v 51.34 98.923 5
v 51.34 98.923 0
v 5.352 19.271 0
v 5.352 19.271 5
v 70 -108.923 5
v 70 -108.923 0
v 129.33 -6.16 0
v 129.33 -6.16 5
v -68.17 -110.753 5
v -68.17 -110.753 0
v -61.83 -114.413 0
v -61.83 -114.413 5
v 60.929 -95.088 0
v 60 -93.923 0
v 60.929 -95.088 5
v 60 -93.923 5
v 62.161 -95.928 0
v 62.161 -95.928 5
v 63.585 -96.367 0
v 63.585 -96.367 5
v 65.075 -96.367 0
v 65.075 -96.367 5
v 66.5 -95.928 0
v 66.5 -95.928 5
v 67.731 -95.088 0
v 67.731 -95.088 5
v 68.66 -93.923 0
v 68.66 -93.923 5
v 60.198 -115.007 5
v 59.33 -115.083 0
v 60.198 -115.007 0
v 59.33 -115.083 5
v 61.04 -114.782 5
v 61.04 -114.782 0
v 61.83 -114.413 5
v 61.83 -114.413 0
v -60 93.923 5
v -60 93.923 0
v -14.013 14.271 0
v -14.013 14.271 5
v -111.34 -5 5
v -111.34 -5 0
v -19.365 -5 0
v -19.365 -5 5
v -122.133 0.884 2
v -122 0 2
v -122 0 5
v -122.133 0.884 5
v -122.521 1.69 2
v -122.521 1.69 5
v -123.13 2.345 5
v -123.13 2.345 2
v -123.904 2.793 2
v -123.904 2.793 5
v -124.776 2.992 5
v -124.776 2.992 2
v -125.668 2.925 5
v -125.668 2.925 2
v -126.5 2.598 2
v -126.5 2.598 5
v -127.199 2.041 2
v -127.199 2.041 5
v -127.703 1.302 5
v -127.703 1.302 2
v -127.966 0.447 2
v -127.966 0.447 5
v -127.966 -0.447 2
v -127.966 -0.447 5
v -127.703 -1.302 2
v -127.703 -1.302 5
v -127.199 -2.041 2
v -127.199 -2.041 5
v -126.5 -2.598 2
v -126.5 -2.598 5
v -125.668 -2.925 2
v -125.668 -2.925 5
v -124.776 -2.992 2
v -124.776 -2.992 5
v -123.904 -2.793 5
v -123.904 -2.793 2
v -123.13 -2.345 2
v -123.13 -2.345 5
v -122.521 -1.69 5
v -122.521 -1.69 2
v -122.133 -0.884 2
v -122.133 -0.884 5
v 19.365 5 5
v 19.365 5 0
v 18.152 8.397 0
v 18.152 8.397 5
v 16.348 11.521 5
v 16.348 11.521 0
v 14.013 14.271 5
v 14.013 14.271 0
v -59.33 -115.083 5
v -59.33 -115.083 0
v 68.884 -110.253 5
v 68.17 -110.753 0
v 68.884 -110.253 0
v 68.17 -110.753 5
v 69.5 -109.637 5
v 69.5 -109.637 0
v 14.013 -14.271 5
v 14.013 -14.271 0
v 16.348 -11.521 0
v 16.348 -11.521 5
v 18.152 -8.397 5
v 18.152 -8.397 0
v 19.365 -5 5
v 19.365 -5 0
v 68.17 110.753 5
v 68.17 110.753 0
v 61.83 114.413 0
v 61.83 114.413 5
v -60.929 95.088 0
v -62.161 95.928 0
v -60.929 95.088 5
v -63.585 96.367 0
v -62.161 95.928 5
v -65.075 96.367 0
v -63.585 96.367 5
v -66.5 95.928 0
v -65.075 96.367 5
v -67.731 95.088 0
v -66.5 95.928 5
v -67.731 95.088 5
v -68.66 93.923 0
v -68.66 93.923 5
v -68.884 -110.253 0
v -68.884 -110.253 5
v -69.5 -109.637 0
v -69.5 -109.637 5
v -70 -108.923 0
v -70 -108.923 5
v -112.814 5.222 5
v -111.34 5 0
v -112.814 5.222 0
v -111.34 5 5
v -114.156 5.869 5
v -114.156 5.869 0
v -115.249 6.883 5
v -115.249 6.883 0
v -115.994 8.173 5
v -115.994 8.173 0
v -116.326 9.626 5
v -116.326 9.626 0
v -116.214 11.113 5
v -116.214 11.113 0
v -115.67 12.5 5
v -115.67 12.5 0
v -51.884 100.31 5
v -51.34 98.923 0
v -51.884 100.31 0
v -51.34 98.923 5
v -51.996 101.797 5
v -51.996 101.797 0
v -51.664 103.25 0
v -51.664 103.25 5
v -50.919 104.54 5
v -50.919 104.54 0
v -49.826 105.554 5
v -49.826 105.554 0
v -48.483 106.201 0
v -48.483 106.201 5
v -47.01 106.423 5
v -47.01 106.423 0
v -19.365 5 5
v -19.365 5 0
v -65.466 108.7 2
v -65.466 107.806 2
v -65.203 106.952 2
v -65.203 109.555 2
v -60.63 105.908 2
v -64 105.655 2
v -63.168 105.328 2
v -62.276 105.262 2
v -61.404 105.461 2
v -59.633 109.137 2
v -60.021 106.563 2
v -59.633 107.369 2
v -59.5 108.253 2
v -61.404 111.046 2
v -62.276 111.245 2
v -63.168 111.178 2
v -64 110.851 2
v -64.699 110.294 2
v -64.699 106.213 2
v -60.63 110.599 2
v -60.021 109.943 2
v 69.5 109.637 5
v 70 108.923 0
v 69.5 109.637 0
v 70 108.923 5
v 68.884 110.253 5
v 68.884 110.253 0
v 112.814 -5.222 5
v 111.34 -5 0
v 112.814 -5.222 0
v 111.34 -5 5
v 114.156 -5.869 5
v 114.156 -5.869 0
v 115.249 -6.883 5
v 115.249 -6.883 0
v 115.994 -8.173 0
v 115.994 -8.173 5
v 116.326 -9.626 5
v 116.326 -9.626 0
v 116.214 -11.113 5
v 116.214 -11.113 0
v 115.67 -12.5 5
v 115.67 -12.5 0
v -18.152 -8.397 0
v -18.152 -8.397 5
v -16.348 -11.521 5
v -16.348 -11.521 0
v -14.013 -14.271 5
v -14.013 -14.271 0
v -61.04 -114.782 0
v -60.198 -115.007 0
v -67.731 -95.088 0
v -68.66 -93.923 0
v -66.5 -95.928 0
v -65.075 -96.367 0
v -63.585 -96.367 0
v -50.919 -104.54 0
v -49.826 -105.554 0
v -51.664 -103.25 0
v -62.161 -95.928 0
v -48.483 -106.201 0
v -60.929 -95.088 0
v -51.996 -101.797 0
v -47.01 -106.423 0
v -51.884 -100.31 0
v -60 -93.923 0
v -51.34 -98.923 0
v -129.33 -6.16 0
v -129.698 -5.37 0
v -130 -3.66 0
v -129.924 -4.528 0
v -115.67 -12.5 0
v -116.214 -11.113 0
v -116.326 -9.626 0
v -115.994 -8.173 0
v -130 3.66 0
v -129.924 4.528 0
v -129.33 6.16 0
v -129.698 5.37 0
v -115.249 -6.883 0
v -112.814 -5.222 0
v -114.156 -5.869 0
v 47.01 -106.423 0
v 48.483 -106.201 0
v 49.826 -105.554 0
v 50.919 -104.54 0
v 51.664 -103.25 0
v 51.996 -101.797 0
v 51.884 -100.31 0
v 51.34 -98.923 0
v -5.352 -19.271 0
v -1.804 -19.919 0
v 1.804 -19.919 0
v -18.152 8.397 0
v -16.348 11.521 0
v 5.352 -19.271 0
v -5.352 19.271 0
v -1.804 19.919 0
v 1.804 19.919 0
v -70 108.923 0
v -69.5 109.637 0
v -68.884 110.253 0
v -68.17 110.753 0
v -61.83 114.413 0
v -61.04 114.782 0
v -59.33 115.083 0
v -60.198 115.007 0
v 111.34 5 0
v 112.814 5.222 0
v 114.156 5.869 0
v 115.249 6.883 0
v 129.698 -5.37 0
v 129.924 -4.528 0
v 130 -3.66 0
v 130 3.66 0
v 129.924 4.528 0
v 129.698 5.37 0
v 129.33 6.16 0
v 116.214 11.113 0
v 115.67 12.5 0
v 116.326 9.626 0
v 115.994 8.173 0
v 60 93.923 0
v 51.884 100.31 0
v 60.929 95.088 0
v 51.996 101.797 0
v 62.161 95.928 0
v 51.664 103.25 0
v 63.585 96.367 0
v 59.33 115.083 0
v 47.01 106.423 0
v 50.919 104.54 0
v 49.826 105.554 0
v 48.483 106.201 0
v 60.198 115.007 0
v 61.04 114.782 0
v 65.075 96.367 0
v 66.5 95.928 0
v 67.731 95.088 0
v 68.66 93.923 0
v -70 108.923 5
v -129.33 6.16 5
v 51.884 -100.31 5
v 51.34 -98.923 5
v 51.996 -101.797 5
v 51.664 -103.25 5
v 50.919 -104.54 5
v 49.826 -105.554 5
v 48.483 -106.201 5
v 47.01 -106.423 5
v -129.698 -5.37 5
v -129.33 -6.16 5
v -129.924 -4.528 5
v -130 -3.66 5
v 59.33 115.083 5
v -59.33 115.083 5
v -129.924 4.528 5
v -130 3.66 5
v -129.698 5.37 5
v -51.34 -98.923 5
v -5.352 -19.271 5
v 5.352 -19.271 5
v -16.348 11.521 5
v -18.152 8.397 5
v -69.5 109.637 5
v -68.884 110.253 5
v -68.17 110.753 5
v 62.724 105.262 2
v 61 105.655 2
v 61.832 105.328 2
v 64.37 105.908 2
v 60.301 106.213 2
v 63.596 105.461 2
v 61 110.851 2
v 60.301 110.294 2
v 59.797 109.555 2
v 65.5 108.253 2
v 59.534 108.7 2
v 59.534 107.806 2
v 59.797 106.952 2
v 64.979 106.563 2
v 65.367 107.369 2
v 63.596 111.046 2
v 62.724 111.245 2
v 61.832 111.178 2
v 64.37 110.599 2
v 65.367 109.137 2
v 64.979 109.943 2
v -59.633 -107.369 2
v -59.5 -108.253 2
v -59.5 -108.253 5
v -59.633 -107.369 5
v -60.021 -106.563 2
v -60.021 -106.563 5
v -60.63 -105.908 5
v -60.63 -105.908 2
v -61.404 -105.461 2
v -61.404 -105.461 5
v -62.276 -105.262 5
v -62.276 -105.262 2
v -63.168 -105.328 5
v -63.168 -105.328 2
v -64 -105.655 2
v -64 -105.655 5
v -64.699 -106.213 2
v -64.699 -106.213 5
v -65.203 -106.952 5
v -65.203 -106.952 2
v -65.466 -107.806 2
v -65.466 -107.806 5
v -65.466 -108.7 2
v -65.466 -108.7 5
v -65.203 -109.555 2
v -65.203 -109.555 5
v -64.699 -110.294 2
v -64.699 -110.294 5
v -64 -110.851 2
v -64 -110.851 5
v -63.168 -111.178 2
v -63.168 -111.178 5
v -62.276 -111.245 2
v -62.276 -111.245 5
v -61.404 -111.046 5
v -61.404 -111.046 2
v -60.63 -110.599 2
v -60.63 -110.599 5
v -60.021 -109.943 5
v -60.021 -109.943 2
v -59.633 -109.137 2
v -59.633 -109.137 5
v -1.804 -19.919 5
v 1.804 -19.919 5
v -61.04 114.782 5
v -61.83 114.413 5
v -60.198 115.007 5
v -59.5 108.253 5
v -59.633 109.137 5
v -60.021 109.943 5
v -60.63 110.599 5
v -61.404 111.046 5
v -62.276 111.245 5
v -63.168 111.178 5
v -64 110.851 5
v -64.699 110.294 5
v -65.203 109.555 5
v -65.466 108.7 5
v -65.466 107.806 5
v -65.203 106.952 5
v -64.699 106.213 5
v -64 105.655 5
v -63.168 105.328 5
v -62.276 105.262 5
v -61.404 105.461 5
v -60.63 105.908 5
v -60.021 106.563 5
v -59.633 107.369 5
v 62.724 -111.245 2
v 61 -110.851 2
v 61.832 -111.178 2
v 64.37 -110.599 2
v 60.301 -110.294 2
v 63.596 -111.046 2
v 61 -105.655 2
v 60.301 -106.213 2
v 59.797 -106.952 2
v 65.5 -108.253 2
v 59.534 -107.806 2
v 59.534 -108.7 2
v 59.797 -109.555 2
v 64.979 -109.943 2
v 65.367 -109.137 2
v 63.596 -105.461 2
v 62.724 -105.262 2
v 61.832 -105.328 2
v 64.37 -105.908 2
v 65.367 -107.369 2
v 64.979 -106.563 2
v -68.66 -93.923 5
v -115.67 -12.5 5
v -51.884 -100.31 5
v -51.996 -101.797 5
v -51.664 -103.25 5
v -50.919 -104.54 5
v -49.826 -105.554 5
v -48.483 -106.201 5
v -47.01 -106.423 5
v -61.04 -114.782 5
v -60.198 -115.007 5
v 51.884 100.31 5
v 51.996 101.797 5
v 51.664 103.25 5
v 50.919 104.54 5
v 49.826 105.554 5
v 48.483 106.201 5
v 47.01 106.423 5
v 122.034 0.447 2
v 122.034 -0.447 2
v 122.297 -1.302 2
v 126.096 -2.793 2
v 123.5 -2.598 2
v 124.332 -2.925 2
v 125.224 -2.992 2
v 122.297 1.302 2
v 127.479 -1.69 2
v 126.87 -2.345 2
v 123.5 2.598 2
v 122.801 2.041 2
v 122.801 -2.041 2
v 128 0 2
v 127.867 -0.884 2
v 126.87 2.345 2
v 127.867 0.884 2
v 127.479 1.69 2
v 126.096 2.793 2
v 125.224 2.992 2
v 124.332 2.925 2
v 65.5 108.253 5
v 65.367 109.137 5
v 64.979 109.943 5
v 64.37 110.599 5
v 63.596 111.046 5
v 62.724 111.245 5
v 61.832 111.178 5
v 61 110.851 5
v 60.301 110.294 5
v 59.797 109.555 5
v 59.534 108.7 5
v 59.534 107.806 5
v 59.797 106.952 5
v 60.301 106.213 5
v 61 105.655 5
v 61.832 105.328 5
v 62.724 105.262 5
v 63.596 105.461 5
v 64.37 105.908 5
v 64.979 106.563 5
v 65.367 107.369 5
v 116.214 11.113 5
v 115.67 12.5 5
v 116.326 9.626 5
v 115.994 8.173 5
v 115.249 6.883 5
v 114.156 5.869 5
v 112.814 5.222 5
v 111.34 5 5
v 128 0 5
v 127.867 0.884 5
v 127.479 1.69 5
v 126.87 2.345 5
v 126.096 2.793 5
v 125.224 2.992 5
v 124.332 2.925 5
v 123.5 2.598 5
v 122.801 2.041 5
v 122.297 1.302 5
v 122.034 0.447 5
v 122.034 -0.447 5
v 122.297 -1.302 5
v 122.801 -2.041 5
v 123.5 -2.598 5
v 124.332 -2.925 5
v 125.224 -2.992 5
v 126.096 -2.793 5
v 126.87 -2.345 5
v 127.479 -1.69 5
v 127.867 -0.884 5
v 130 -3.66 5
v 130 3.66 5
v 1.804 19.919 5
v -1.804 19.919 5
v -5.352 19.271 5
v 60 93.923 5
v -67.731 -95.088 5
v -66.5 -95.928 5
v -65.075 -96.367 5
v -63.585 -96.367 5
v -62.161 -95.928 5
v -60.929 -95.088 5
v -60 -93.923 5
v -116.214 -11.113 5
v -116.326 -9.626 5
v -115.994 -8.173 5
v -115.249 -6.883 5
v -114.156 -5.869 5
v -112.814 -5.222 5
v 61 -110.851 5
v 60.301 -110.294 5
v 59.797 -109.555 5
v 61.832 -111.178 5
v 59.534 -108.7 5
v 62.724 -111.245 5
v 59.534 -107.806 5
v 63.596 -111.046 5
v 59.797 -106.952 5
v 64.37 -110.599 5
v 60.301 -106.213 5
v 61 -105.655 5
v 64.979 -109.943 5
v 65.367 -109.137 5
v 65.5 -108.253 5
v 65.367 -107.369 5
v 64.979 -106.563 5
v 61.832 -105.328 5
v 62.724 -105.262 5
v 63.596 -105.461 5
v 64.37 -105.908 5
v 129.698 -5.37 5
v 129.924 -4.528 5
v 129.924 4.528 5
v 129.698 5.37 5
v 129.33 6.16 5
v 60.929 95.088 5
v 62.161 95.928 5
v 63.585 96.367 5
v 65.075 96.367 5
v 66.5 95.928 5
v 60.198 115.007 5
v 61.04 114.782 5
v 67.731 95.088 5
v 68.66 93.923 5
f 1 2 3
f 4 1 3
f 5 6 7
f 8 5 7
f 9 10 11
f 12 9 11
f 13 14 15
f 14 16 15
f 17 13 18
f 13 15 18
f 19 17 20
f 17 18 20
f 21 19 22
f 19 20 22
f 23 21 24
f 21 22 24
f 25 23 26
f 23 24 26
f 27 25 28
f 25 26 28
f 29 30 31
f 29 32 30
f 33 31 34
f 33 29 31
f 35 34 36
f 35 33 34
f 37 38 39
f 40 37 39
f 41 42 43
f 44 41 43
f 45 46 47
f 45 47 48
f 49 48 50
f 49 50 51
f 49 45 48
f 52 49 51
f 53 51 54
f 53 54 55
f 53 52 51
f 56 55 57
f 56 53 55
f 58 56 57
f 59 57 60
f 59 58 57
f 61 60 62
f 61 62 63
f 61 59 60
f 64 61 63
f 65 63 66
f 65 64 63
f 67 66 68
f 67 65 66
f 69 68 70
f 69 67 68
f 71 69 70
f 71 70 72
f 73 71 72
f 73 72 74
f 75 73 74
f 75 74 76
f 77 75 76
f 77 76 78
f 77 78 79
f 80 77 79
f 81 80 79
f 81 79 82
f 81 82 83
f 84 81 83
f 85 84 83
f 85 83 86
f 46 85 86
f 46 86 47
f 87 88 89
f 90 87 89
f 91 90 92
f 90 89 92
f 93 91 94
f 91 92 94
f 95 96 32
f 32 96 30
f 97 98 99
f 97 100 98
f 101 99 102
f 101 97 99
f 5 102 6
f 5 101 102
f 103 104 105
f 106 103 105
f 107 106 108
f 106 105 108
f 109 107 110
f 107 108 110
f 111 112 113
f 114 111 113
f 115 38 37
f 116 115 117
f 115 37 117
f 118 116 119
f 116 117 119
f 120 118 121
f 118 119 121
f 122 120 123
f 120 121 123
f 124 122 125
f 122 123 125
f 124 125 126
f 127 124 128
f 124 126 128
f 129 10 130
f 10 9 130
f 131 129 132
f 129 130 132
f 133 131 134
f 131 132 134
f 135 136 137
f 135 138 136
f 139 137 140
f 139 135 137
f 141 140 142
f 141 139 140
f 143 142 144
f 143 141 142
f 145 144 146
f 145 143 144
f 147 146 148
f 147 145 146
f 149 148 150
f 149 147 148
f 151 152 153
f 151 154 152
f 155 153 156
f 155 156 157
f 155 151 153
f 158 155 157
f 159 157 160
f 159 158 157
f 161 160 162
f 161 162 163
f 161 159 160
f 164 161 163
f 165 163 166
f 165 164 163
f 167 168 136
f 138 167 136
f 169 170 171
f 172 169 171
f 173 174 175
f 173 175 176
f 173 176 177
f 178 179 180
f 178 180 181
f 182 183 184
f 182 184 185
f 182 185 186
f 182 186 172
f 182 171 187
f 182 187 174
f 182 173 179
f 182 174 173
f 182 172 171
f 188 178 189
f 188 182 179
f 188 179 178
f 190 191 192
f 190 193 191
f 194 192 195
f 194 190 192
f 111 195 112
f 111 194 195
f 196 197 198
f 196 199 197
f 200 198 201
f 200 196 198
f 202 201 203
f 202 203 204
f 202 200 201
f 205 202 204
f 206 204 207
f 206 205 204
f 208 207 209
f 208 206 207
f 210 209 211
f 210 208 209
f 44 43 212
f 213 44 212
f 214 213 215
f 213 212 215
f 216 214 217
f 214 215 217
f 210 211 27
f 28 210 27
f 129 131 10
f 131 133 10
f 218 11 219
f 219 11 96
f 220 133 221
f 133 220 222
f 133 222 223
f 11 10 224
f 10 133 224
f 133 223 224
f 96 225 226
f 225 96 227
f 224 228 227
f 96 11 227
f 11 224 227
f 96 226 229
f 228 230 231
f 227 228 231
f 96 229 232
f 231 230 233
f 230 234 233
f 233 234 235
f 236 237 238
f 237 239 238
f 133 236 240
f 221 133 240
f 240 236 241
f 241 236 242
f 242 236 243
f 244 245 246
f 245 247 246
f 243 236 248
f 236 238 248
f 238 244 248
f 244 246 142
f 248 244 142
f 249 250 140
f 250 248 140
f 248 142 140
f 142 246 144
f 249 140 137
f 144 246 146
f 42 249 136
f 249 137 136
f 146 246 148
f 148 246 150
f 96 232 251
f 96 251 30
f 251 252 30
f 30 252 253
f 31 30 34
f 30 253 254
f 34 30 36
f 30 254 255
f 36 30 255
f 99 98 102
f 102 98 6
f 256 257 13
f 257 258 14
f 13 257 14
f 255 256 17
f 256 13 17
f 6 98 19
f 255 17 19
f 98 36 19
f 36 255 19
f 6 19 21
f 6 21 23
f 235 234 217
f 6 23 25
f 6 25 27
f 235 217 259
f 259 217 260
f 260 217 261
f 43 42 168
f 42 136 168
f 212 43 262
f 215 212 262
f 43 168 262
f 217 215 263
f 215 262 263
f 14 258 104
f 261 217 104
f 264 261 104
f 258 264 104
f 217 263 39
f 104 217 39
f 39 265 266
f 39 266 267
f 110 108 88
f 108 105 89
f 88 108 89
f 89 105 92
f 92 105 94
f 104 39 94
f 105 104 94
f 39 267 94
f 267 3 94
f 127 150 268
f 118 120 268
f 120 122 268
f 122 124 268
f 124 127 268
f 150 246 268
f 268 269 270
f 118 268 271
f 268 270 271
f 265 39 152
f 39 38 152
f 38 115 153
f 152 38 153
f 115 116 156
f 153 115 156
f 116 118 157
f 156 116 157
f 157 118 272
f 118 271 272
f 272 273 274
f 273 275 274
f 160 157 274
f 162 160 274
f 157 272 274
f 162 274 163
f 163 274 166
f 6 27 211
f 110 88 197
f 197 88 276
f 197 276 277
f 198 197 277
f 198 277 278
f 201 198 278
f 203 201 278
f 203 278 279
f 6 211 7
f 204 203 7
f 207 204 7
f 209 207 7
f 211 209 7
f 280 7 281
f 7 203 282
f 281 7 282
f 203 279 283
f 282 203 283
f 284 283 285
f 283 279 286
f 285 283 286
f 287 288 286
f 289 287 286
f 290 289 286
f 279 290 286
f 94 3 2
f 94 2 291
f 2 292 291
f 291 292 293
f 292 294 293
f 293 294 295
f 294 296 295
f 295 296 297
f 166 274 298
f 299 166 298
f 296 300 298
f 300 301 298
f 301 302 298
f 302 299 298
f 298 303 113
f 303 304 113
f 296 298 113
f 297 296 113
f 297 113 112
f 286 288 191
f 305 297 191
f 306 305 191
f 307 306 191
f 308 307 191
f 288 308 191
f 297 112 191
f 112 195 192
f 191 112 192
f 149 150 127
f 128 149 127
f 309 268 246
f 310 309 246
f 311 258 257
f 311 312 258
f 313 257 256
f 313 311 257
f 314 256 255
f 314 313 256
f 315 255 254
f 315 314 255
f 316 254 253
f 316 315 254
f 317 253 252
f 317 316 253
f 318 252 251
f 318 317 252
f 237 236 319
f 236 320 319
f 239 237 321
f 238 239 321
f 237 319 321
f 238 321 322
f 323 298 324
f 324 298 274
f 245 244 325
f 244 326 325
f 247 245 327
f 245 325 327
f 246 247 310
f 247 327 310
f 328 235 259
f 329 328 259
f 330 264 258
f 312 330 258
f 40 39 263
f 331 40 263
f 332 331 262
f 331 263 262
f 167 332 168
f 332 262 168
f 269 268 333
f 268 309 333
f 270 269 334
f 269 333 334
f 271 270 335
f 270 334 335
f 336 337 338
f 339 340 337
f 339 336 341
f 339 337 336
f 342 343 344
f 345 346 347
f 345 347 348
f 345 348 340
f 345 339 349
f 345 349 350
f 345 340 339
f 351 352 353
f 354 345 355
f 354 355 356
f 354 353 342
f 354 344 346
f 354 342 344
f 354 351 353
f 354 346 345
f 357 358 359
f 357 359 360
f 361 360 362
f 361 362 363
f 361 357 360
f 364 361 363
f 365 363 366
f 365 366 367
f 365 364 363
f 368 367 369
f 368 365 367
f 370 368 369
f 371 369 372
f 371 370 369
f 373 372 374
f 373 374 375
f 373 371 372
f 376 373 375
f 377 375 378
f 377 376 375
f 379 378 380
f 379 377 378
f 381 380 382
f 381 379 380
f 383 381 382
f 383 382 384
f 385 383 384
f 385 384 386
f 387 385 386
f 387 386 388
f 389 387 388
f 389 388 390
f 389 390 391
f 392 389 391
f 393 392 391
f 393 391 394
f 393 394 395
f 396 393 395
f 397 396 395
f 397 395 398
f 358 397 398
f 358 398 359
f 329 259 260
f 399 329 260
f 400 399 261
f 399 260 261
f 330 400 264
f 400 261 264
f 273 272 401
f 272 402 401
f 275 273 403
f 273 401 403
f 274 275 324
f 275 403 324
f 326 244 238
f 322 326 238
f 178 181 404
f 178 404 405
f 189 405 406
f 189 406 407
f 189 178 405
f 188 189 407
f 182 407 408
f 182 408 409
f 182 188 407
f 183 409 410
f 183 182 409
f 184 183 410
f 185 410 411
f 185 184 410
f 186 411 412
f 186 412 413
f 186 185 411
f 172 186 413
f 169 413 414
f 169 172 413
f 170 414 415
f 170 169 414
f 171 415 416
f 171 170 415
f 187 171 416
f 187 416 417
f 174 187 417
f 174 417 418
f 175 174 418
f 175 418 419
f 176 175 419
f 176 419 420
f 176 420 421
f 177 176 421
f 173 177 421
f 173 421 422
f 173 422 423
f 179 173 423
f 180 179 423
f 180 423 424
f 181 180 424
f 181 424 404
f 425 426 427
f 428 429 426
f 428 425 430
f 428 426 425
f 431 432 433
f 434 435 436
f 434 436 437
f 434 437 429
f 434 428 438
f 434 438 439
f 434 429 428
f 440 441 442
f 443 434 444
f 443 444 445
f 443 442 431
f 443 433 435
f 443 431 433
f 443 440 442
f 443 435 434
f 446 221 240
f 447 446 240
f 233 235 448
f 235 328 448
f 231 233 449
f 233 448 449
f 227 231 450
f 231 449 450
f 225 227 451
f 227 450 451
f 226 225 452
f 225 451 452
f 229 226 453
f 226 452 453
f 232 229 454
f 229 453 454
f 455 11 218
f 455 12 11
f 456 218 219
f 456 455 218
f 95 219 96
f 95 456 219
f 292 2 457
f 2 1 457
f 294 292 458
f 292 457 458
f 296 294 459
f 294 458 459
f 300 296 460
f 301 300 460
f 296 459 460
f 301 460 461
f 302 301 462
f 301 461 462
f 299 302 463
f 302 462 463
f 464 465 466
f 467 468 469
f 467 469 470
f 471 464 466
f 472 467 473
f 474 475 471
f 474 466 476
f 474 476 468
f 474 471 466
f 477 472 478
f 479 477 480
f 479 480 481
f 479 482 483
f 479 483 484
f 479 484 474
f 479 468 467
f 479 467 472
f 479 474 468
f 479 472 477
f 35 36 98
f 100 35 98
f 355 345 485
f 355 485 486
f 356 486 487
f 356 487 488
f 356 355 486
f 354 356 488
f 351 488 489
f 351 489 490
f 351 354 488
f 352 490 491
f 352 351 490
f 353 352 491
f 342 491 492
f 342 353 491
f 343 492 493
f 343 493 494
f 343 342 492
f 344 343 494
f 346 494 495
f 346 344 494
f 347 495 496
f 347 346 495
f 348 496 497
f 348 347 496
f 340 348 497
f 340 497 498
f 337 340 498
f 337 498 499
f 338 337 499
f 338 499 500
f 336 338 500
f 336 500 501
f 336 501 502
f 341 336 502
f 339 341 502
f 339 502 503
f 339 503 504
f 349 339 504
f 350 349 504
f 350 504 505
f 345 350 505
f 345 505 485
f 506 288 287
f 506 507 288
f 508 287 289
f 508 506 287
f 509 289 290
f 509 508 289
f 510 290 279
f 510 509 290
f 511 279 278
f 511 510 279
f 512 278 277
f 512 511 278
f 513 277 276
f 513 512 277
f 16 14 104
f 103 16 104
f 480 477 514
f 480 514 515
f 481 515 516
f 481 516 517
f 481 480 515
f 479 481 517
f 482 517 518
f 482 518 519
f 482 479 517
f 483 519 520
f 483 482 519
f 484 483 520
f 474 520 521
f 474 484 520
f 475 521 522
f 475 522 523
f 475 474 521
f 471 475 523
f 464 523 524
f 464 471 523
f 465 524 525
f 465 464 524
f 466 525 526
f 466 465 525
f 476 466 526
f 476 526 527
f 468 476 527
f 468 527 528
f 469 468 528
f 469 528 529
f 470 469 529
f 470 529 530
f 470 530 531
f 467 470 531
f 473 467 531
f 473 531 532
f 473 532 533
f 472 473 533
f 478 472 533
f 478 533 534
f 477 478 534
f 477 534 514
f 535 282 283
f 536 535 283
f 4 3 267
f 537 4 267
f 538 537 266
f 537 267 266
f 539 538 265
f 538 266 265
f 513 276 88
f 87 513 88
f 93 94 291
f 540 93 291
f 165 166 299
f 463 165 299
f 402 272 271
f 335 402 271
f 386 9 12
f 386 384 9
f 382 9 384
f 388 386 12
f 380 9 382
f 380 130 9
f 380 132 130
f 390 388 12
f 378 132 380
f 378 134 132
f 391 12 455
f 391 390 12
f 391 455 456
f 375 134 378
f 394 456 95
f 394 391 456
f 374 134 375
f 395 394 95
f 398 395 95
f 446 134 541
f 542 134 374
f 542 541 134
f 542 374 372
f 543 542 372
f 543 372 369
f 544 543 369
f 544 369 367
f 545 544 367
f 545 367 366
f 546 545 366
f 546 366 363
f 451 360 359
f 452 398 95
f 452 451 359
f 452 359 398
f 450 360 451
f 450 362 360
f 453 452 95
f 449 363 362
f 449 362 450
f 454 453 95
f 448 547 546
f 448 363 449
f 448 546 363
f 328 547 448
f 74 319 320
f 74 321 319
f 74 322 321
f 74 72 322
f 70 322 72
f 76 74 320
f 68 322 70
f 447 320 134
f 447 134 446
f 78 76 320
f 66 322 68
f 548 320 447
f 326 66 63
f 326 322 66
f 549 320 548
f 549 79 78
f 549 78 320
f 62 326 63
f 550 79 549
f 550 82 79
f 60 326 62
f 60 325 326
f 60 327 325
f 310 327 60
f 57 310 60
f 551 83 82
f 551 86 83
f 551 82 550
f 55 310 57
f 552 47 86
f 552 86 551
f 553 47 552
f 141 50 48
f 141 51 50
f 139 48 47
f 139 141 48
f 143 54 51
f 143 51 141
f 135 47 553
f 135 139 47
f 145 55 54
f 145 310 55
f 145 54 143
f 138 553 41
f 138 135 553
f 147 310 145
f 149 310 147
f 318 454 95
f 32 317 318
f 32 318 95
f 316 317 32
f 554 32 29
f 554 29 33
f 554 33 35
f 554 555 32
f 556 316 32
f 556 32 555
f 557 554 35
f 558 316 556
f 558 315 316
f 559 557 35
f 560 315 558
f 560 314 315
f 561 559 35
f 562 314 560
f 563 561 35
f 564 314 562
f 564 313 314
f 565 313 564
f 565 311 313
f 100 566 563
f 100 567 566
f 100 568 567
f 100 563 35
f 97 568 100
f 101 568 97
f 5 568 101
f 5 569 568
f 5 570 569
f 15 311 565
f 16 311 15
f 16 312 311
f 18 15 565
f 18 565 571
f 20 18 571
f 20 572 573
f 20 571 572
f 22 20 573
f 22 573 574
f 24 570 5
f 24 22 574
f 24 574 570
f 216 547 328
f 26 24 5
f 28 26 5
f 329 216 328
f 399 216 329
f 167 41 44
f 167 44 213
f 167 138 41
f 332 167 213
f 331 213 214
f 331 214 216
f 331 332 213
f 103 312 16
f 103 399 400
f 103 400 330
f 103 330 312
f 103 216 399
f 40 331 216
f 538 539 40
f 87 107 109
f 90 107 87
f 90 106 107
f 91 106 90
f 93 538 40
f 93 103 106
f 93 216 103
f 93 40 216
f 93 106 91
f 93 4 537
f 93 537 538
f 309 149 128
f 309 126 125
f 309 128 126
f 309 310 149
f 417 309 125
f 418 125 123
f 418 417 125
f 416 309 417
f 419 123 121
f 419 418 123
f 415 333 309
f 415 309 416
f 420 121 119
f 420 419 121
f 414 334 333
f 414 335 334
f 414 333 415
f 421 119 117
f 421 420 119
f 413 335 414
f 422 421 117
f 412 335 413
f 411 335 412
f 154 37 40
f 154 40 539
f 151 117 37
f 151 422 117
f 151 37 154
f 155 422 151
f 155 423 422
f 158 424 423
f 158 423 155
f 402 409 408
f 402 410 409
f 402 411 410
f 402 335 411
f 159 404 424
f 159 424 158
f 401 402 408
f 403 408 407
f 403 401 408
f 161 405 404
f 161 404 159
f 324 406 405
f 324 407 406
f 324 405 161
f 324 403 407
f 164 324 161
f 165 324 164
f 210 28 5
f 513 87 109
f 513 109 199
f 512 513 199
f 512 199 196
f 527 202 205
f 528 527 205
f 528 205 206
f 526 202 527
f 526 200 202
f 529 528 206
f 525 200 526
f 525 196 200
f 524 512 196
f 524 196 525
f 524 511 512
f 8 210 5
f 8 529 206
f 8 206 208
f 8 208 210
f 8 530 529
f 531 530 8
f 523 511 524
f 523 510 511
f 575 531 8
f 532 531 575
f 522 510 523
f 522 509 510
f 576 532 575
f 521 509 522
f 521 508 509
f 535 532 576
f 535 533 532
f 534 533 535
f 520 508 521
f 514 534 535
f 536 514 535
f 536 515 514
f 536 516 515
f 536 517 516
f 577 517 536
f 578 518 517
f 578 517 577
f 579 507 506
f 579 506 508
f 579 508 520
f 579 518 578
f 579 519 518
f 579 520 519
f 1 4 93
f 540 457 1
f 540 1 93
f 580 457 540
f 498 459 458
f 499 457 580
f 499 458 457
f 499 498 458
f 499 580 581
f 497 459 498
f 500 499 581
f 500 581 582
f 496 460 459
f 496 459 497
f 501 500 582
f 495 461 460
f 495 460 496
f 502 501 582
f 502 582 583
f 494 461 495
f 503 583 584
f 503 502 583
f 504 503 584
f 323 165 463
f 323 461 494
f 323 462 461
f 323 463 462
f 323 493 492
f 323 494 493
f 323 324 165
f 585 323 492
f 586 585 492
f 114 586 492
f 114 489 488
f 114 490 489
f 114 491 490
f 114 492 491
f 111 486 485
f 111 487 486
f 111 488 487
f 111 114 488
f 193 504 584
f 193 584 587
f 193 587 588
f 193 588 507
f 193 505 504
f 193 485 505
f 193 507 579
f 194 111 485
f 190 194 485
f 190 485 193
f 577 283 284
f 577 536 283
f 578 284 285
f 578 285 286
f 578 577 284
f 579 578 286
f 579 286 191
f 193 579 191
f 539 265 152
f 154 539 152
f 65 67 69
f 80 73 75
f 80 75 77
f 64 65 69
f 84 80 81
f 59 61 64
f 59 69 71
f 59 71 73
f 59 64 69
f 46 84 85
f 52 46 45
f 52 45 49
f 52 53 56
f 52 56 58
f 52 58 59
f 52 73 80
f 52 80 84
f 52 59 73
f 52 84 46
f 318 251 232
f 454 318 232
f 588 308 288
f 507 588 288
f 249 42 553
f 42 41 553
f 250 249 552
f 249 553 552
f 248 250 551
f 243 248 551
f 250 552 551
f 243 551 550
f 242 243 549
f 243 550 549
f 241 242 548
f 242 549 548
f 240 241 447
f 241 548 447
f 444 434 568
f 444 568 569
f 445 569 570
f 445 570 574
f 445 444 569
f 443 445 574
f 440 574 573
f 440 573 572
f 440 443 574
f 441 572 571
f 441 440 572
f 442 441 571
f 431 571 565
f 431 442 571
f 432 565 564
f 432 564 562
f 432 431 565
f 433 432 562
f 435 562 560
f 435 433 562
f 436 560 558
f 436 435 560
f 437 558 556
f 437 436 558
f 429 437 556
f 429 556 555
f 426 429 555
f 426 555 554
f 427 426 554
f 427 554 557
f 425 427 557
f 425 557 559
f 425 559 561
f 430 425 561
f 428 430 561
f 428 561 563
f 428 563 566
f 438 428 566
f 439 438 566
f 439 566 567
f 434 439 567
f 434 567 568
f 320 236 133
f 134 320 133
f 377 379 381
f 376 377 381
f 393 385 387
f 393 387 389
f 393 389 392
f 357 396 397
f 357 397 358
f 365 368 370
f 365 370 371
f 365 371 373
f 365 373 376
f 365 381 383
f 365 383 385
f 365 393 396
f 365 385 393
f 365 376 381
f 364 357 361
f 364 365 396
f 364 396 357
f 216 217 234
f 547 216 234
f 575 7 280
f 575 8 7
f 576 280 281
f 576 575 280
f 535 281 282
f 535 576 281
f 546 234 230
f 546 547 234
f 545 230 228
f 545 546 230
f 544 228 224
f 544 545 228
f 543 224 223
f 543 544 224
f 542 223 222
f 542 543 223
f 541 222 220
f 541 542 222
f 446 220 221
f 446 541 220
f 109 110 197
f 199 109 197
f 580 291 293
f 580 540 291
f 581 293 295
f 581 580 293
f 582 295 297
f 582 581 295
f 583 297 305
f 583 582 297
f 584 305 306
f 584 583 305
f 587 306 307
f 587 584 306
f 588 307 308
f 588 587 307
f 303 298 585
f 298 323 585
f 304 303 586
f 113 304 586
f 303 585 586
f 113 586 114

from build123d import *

# Parameters (mm, degrees)
F0_R      = 3
F1_DEPTH  = 5
F2_DEPTH  = 5
F3_R      = 5
F4_R      = 5
F5_DEPTH  = 2
F6_DEPTH  = 2
F7_DEPTH  = 2
F8_DEPTH  = 2
F9_DEPTH  = 2
F10_DEPTH = 2
F11_R     = 5


with BuildPart() as f1:
    # F0 (on Top) → F1 (new body)
    with BuildSketch(Plane.XY):
        Polygon((-60.669873, 115.083302), (-65, 112.583302), (-69.330127, 110.083302), (-130, 5), (-130, 0), (-130, -5), (-69.330127, -110.083302), (-65, -112.583302), (-60.669873, -115.083302), (60.669873, -115.083302), (65, -112.583302), (69.330127, -110.083302), (130, -5), (130, 0), (130, 5), (69.330127, 110.083302), (65, 112.583302), (60.669873, 115.083302), align=None)
        with Locations((-62.5, -108.253175)):
            Circle(F0_R, mode=Mode.SUBTRACT)
        with Locations((-125, 0)):
            Circle(F0_R, mode=Mode.SUBTRACT)
        with Locations((62.5, -108.253175)):
            Circle(F0_R, mode=Mode.SUBTRACT)
        Polygon((64.330127, 101.423048), (120, 5), (120, -5), (64.330127, -101.423048), (55.669873, -106.423048), (-55.669873, -106.423048), (-64.330127, -101.423048), (-120, -5), (-120, 5), (-64.330127, 101.423048), (-60, 103.923048), (-55.669873, 106.423048), (55.669873, 106.423048), (60, 103.923048), align=None, mode=Mode.SUBTRACT)
        with Locations((125, 0)):
            Circle(F0_R, mode=Mode.SUBTRACT)
        with Locations((-62.5, 108.253175)):
            Circle(F0_R, mode=Mode.SUBTRACT)
        with Locations((62.5, 108.253175)):
            Circle(F0_R, mode=Mode.SUBTRACT)
    extrude(amount=F1_DEPTH)

    # F0 (on Top) → F2 (join)
    with BuildSketch(Plane.XY):
        with BuildLine():
            ThreePointArc((19.364917, -5), (19.840594, -2.520086), (20, 0))
            ThreePointArc((20, 0), (19.840594, 2.520086), (19.364917, 5))
            ThreePointArc((19.364917, 5), (17.320508, 10), (14.012585, 14.27051))
            ThreePointArc((14.012585, 14.27051), (10, 17.320508), (5.352331, 19.27051))
            ThreePointArc((5.352331, 19.27051), (0, 20), (-5.352331, 19.27051))
            ThreePointArc((-5.352331, 19.27051), (-10, 17.320508), (-14.012585, 14.27051))
            ThreePointArc((-14.012585, 14.27051), (-17.320508, 10), (-19.364917, 5))
            ThreePointArc((-19.364917, 5), (-20, 0), (-19.364917, -5))
            ThreePointArc((-19.364917, -5), (-17.320508, -10), (-14.012585, -14.27051))
            ThreePointArc((-14.012585, -14.27051), (-10, -17.320508), (-5.352331, -19.27051))
            ThreePointArc((-5.352331, -19.27051), (0, -20), (5.352331, -19.27051))
            ThreePointArc((5.352331, -19.27051), (10, -17.320508), (14.012585, -14.27051))
            ThreePointArc((14.012585, -14.27051), (17.320508, -10), (19.364917, -5))
        make_face()
        with BuildLine():
            ThreePointArc((-19.364917, -5), (-20, 0), (-19.364917, 5))
            Line((-19.364917, 5), (-120, 5))
            Line((-120, 5), (-120, -5))
            Line((-120, -5), (-19.364917, -5))
        make_face()
        with BuildLine():
            ThreePointArc((-14.012585, 14.27051), (-10, 17.320508), (-5.352331, 19.27051))
            Line((-5.352331, 19.27051), (-55.669873, 106.423048))
            Line((-55.669873, 106.423048), (-60, 103.923048))
            Line((-60, 103.923048), (-64.330127, 101.423048))
            Line((-64.330127, 101.423048), (-14.012585, 14.27051))
        make_face()
        with BuildLine():
            ThreePointArc((5.352331, 19.27051), (10, 17.320508), (14.012585, 14.27051))
            Line((14.012585, 14.27051), (64.330127, 101.423048))
            Line((64.330127, 101.423048), (60, 103.923048))
            Line((60, 103.923048), (55.669873, 106.423048))
            Line((55.669873, 106.423048), (5.352331, 19.27051))
        make_face()
        with BuildLine():
            ThreePointArc((19.364917, 5), (19.840594, 2.520086), (20, 0))
            ThreePointArc((20, 0), (19.840594, -2.520086), (19.364917, -5))
            Line((19.364917, -5), (120, -5))
            Line((120, -5), (120, 5))
            Line((120, 5), (19.364917, 5))
        make_face()
        with BuildLine():
            Line((64.330127, -101.423048), (14.012585, -14.27051))
            ThreePointArc((14.012585, -14.27051), (10, -17.320508), (5.352331, -19.27051))
            Line((5.352331, -19.27051), (55.669873, -106.423048))
            Line((55.669873, -106.423048), (64.330127, -101.423048))
        make_face()
        with BuildLine():
            Line((-55.669873, -106.423048), (-5.352331, -19.27051))
            ThreePointArc((-5.352331, -19.27051), (-10, -17.320508), (-14.012585, -14.27051))
            Line((-14.012585, -14.27051), (-64.330127, -101.423048))
            Line((-64.330127, -101.423048), (-55.669873, -106.423048))
        make_face()
    extrude(amount=F2_DEPTH)

    # F3
    f3_edges = [f1.edges().sort_by_distance(p)[0] for p in [
        (-60.669873, -115.083302, 2.5),
    ]]
    fillet(f3_edges, radius=F3_R)

    # F4
    f4_edges = [f1.edges().sort_by_distance(p)[0] for p in [
        (-69.330127, -110.083302, 2.5),
        (60.669873, -115.083302, 2.5),
        (69.330127, -110.083302, 2.5),
        (130, -5, 2.5),
        (130, 5, 2.5),
        (69.330127, 110.083302, 2.5),
        (60.669873, 115.083302, 2.5),
        (-60.669873, 115.083302, 2.5),
        (-69.330127, 110.083302, 2.5),
        (-130, 5, 2.5),
        (-130, -5, 2.5),
    ]]
    fillet(f4_edges, radius=F4_R)

    # F0 (on Top) → F5 (join)
    with BuildSketch(Plane.XY):
        with Locations((-125, 0)):
            Circle(F0_R)
    extrude(amount=F5_DEPTH)

    # F0 (on Top) → F6 (join)
    with BuildSketch(Plane.XY):
        with Locations((-62.5, 108.253175)):
            Circle(F0_R)
    extrude(amount=F6_DEPTH)

    # F0 (on Top) → F7 (join)
    with BuildSketch(Plane.XY):
        with Locations((62.5, 108.253175)):
            Circle(F0_R)
    extrude(amount=F7_DEPTH)

    # F0 (on Top) → F8 (join)
    with BuildSketch(Plane.XY):
        with Locations((125, 0)):
            Circle(F0_R)
    extrude(amount=F8_DEPTH)

    # F0 (on Top) → F9 (join)
    with BuildSketch(Plane.XY):
        with Locations((62.5, -108.253175)):
            Circle(F0_R)
    extrude(amount=F9_DEPTH)

    # F0 (on Top) → F10 (join)
    with BuildSketch(Plane.XY):
        with Locations((-62.5, -108.253175)):
            Circle(F0_R)
    extrude(amount=F10_DEPTH)

    # F11
    f11_edges = [f1.edges().sort_by_distance(p)[0] for p in [
        (-64.330127, -101.423048, 2.5),
        (-120, -5, 2.5),
        (-120, 5, 2.5),
        (-64.330127, 101.423048, 2.5),
        (-55.669873, 106.423048, 2.5),
        (55.669873, 106.423048, 2.5),
        (64.330127, 101.423048, 2.5),
        (120, 5, 2.5),
        (120, -5, 2.5),
        (64.330127, -101.423048, 2.5),
        (55.669873, -106.423048, 2.5),
        (-55.669873, -106.423048, 2.5),
    ]]
    fillet(f11_edges, radius=F11_R)


solid = f1.part
